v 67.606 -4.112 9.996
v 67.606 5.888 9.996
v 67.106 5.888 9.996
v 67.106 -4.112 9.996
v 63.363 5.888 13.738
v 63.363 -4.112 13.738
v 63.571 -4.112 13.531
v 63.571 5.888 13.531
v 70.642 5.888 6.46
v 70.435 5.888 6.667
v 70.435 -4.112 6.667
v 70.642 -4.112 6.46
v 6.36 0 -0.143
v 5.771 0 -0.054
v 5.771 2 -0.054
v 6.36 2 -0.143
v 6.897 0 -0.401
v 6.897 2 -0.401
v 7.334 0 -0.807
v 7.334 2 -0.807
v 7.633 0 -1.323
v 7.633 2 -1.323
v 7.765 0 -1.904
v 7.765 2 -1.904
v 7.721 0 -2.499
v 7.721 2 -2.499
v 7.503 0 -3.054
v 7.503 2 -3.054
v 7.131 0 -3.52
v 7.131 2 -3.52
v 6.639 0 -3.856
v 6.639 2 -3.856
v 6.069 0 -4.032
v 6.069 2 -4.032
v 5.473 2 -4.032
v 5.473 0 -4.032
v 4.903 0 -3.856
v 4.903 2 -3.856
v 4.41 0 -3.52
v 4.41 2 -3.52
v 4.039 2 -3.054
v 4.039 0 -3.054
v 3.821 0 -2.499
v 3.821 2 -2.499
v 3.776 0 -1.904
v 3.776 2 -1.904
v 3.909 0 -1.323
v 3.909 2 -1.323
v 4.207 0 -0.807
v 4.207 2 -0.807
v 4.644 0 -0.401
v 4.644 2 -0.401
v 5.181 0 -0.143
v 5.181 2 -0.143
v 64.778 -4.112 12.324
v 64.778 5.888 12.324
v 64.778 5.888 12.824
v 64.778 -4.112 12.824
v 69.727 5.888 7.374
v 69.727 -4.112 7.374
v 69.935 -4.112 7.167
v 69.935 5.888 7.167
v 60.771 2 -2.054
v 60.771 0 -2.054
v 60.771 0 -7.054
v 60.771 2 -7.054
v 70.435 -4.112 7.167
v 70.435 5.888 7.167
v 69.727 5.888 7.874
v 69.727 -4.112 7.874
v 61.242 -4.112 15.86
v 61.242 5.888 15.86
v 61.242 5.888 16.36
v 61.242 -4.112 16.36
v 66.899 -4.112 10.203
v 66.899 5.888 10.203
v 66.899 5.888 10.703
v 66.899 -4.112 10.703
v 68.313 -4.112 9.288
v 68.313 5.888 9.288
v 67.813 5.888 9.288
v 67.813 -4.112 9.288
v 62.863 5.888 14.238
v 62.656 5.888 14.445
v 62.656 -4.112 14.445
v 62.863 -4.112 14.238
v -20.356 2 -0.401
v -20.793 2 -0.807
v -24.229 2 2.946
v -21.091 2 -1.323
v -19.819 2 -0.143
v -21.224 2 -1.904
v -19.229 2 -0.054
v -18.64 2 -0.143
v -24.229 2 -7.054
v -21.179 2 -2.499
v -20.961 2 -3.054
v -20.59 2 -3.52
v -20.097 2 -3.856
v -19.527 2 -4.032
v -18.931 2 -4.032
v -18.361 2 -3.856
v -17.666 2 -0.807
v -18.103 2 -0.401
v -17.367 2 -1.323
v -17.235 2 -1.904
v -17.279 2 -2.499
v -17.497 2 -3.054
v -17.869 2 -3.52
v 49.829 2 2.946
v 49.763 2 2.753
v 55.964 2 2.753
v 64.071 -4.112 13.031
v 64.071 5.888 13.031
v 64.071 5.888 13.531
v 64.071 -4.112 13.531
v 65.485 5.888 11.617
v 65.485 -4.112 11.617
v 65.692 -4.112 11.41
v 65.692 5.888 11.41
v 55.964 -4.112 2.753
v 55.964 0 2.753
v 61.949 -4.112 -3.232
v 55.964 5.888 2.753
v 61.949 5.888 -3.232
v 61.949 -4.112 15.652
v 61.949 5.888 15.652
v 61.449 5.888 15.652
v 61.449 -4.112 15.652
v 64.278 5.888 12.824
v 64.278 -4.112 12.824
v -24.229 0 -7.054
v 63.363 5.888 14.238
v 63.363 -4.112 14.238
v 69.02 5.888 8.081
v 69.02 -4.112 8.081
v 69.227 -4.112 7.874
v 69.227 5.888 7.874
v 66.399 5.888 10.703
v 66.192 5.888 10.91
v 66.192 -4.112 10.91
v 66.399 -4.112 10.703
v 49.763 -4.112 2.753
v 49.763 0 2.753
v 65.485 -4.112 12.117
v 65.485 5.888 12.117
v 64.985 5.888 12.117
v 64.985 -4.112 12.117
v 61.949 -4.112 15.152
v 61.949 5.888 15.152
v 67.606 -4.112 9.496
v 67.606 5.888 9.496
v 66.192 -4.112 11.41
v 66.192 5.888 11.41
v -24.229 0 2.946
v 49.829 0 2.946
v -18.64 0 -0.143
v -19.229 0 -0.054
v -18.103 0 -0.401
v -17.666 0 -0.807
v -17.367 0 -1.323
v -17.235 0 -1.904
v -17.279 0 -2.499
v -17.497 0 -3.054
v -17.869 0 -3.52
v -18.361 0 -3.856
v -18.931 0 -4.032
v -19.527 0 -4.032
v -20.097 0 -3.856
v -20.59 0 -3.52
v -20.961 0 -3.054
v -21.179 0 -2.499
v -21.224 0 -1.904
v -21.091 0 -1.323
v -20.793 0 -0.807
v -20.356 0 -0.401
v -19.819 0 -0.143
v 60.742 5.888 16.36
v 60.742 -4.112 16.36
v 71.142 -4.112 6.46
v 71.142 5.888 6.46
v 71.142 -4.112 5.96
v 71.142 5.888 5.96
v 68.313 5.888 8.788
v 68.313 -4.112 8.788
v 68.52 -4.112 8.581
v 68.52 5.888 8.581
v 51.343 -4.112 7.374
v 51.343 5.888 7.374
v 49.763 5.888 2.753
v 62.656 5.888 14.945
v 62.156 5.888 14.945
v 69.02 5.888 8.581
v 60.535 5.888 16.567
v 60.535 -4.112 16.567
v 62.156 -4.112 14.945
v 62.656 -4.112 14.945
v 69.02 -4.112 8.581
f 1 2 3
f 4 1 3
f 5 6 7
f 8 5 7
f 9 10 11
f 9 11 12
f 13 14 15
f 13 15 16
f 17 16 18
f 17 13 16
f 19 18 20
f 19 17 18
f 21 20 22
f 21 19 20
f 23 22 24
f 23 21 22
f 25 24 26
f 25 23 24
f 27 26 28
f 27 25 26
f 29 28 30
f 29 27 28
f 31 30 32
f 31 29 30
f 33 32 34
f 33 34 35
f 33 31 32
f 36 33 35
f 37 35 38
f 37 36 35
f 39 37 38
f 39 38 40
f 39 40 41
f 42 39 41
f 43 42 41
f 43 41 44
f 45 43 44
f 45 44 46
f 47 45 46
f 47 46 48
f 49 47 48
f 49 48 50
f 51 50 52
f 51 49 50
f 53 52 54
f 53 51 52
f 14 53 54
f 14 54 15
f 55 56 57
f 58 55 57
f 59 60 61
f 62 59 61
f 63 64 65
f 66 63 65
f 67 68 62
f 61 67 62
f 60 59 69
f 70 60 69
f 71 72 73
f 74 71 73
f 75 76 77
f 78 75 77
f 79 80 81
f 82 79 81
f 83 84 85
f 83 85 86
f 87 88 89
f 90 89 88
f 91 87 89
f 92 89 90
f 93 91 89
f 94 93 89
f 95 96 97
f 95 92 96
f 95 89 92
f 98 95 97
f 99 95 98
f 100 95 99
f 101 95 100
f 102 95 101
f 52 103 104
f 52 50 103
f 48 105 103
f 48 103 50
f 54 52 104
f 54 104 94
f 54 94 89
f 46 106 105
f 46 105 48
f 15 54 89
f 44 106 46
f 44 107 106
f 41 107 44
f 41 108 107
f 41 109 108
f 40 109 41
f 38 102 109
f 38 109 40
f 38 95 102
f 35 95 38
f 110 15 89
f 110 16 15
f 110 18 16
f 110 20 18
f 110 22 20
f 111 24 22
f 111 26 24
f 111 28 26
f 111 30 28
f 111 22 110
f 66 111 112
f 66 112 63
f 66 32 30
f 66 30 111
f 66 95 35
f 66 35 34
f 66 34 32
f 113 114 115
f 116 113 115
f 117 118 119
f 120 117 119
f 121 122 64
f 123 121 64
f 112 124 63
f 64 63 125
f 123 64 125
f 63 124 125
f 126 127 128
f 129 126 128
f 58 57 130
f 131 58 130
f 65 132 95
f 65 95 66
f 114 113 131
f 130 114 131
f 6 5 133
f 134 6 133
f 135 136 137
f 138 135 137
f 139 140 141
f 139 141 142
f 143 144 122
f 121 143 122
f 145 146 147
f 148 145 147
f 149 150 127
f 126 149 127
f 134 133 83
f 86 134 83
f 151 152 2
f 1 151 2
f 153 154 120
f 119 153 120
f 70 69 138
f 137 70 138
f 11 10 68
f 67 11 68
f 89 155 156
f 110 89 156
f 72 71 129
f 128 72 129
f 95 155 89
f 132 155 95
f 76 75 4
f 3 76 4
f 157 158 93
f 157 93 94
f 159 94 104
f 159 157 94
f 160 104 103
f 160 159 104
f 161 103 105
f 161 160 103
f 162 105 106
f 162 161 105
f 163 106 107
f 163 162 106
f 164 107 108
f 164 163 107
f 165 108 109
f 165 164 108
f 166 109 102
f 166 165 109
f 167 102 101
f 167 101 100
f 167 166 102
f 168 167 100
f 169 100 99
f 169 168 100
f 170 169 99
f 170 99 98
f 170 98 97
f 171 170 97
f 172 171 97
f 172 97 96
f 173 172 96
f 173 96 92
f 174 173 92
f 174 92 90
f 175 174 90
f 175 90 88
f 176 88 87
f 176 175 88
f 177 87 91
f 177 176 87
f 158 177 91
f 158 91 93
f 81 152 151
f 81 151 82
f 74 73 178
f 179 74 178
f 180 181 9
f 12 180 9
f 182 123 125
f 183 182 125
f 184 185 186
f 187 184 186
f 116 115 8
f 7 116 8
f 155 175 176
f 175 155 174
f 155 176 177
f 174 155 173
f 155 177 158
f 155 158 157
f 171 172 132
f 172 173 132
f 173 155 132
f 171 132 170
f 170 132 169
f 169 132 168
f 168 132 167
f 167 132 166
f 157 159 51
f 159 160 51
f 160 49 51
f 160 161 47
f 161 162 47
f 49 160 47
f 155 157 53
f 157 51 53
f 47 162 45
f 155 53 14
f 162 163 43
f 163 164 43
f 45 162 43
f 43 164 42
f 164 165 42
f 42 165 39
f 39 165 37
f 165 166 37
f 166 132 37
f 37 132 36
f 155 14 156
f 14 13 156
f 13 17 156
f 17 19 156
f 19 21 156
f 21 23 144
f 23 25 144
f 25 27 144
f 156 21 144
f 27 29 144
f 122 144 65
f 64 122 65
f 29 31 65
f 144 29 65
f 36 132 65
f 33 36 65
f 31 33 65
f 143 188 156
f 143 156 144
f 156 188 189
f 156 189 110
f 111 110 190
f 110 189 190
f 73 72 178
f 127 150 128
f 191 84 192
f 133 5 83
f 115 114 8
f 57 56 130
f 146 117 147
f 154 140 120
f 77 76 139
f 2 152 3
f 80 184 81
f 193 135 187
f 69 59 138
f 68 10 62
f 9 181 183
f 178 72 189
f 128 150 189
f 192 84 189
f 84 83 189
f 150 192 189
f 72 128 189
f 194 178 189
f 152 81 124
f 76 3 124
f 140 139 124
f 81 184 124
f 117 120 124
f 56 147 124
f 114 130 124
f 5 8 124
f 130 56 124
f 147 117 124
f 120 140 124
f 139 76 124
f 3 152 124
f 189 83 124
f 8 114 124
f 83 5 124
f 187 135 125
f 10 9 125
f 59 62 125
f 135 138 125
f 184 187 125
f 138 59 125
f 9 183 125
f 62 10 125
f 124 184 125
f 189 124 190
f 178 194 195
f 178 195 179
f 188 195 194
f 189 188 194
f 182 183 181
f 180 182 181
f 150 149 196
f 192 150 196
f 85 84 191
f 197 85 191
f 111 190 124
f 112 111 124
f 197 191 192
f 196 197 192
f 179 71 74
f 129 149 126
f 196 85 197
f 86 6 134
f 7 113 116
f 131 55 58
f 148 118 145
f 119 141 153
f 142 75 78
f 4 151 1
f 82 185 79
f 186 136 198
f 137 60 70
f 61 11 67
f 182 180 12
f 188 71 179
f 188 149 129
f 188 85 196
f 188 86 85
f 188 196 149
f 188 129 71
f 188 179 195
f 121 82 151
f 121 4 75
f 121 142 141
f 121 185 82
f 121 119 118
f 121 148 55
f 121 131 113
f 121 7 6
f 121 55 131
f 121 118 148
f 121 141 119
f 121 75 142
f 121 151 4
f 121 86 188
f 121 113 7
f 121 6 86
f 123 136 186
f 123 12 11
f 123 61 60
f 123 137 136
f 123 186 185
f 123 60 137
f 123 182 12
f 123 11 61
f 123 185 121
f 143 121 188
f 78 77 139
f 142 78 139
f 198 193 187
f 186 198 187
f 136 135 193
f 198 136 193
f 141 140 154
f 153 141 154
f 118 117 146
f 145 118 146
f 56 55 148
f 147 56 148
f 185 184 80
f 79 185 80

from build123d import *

# Parameters (mm, degrees)
SKETCH1_W           = 85
SKETCH1_H           = 10
SKETCH1_R           = 2
BOSS_EXTRUDE1_DEPTH = 2
CUT_EXTRUDE1_DEPTH  = 10
SKETCH3_W           = 15
SKETCH3_H           = 10
BOSS_EXTRUDE2_DEPTH = 13
BOSS_EXTRUDE3_DEPTH = 10
BOSS_EXTRUDE4_DEPTH = 10


with BuildPart() as part:
    # Sketch1 → Boss-Extrude1 (new body)
    with BuildSketch(Plane(origin=(0, 0, 0), x_dir=(1, 0, 0), z_dir=(0, 1, 0))):
        with Locations((18.270818553, 2.053936679)):
            Rectangle(SKETCH1_W, SKETCH1_H)
        with Locations(Location((-19.229181447, 2.053936679, 0), (0, 0, 270))):
            Circle(SKETCH1_R, mode=Mode.SUBTRACT)
        with Locations(Location((5.770818553, 2.053936679, 0), (0, 0, 270))):
            Circle(SKETCH1_R, mode=Mode.SUBTRACT)
    extrude(amount=BOSS_EXTRUDE1_DEPTH)

    # Sketch2 → Cut-Extrude1 (cut)
    with BuildSketch(Plane(origin=(0, 2, 0), x_dir=(1, 0, 0), z_dir=(0, 1, 0))):
        Polygon((60.770818553, 2.053936679), (55.770818553, -2.946063321), (60.770818553, -2.946063321), align=None)
    extrude(amount=-CUT_EXTRUDE1_DEPTH, mode=Mode.SUBTRACT)

    # Sketch3 → Boss-Extrude2 (add)
    with BuildSketch(Plane(origin=(29.358440937, 0, 29.358440937), x_dir=(0.7071067811865439, 0, -0.7071067811865511), z_dir=(0.7071067811865511, 0, 0.7071067811865439))):
        with Locations((38.590339713, 0.888307249)):
            Rectangle(SKETCH3_W, SKETCH3_H)
    extrude(amount=BOSS_EXTRUDE2_DEPTH)

    # Sketch4 → Boss-Extrude3 (add)
    with BuildSketch(Plane(origin=(0, 5.888307249, 0), x_dir=(1, 0, 0), z_dir=(0, 1, 0))):
        Polygon((51.342630977, -7.374250897), (49.762527896, -2.752596668), (55.964285206, -2.752596668), align=None)
    extrude(amount=-BOSS_EXTRUDE3_DEPTH)

    # Sketch5 → Boss-Extrude4 (add)
    with BuildSketch(Plane(origin=(0, 5.888307249, 0), x_dir=(1, 0, 0), z_dir=(0, 1, 0))):
        Polygon((71.141620851, -5.960037335), (71.141620851, -6.460037335), (70.641620851, -6.460037335), align=None)
        Polygon((70.434514069, -6.667144116), (70.434514069, -7.167144116), (69.934514069, -7.167144116), align=None)
        Polygon((69.727407288, -7.374250897), (69.727407288, -7.874250897), (69.227407288, -7.874250897), align=None)
        Polygon((69.020300507, -8.081357678), (69.020300507, -8.581357678), (68.520300507, -8.581357678), align=None)
        Polygon((68.313193726, -8.788464459), (68.313193726, -9.288464459), (67.813193726, -9.288464459), align=None)
        Polygon((67.606086945, -9.495571241), (67.606086945, -9.995571241), (67.106086945, -9.995571241), align=None)
        Polygon((66.898980164, -10.202678022), (66.898980164, -10.702678022), (66.398980164, -10.702678022), align=None)
        Polygon((66.191873382, -10.909784803), (66.191873382, -11.409784803), (65.691873382, -11.409784803), align=None)
        Polygon((65.484766601, -11.616891584), (65.484766601, -12.116891584), (64.984766601, -12.116891584), align=None)
        Polygon((64.77765982, -12.323998365), (64.77765982, -12.823998365), (64.27765982, -12.823998365), align=None)
        Polygon((64.070553039, -13.031105147), (64.070553039, -13.531105147), (63.570553039, -13.531105147), align=None)
        Polygon((63.363446258, -13.738211928), (63.363446258, -14.238211928), (62.863446258, -14.238211928), align=None)
        Polygon((62.656339476, -14.445318709), (62.656339476, -14.945318709), (62.156339476, -14.945318709), align=None)
        Polygon((61.949232695, -15.15242549), (61.949232695, -15.65242549), (61.449232695, -15.65242549), align=None)
        Polygon((61.242125914, -15.859532271), (61.242125914, -16.359532271), (60.742125914, -16.359532271), align=None)
    extrude(amount=-BOSS_EXTRUDE4_DEPTH)


solid = part.part
